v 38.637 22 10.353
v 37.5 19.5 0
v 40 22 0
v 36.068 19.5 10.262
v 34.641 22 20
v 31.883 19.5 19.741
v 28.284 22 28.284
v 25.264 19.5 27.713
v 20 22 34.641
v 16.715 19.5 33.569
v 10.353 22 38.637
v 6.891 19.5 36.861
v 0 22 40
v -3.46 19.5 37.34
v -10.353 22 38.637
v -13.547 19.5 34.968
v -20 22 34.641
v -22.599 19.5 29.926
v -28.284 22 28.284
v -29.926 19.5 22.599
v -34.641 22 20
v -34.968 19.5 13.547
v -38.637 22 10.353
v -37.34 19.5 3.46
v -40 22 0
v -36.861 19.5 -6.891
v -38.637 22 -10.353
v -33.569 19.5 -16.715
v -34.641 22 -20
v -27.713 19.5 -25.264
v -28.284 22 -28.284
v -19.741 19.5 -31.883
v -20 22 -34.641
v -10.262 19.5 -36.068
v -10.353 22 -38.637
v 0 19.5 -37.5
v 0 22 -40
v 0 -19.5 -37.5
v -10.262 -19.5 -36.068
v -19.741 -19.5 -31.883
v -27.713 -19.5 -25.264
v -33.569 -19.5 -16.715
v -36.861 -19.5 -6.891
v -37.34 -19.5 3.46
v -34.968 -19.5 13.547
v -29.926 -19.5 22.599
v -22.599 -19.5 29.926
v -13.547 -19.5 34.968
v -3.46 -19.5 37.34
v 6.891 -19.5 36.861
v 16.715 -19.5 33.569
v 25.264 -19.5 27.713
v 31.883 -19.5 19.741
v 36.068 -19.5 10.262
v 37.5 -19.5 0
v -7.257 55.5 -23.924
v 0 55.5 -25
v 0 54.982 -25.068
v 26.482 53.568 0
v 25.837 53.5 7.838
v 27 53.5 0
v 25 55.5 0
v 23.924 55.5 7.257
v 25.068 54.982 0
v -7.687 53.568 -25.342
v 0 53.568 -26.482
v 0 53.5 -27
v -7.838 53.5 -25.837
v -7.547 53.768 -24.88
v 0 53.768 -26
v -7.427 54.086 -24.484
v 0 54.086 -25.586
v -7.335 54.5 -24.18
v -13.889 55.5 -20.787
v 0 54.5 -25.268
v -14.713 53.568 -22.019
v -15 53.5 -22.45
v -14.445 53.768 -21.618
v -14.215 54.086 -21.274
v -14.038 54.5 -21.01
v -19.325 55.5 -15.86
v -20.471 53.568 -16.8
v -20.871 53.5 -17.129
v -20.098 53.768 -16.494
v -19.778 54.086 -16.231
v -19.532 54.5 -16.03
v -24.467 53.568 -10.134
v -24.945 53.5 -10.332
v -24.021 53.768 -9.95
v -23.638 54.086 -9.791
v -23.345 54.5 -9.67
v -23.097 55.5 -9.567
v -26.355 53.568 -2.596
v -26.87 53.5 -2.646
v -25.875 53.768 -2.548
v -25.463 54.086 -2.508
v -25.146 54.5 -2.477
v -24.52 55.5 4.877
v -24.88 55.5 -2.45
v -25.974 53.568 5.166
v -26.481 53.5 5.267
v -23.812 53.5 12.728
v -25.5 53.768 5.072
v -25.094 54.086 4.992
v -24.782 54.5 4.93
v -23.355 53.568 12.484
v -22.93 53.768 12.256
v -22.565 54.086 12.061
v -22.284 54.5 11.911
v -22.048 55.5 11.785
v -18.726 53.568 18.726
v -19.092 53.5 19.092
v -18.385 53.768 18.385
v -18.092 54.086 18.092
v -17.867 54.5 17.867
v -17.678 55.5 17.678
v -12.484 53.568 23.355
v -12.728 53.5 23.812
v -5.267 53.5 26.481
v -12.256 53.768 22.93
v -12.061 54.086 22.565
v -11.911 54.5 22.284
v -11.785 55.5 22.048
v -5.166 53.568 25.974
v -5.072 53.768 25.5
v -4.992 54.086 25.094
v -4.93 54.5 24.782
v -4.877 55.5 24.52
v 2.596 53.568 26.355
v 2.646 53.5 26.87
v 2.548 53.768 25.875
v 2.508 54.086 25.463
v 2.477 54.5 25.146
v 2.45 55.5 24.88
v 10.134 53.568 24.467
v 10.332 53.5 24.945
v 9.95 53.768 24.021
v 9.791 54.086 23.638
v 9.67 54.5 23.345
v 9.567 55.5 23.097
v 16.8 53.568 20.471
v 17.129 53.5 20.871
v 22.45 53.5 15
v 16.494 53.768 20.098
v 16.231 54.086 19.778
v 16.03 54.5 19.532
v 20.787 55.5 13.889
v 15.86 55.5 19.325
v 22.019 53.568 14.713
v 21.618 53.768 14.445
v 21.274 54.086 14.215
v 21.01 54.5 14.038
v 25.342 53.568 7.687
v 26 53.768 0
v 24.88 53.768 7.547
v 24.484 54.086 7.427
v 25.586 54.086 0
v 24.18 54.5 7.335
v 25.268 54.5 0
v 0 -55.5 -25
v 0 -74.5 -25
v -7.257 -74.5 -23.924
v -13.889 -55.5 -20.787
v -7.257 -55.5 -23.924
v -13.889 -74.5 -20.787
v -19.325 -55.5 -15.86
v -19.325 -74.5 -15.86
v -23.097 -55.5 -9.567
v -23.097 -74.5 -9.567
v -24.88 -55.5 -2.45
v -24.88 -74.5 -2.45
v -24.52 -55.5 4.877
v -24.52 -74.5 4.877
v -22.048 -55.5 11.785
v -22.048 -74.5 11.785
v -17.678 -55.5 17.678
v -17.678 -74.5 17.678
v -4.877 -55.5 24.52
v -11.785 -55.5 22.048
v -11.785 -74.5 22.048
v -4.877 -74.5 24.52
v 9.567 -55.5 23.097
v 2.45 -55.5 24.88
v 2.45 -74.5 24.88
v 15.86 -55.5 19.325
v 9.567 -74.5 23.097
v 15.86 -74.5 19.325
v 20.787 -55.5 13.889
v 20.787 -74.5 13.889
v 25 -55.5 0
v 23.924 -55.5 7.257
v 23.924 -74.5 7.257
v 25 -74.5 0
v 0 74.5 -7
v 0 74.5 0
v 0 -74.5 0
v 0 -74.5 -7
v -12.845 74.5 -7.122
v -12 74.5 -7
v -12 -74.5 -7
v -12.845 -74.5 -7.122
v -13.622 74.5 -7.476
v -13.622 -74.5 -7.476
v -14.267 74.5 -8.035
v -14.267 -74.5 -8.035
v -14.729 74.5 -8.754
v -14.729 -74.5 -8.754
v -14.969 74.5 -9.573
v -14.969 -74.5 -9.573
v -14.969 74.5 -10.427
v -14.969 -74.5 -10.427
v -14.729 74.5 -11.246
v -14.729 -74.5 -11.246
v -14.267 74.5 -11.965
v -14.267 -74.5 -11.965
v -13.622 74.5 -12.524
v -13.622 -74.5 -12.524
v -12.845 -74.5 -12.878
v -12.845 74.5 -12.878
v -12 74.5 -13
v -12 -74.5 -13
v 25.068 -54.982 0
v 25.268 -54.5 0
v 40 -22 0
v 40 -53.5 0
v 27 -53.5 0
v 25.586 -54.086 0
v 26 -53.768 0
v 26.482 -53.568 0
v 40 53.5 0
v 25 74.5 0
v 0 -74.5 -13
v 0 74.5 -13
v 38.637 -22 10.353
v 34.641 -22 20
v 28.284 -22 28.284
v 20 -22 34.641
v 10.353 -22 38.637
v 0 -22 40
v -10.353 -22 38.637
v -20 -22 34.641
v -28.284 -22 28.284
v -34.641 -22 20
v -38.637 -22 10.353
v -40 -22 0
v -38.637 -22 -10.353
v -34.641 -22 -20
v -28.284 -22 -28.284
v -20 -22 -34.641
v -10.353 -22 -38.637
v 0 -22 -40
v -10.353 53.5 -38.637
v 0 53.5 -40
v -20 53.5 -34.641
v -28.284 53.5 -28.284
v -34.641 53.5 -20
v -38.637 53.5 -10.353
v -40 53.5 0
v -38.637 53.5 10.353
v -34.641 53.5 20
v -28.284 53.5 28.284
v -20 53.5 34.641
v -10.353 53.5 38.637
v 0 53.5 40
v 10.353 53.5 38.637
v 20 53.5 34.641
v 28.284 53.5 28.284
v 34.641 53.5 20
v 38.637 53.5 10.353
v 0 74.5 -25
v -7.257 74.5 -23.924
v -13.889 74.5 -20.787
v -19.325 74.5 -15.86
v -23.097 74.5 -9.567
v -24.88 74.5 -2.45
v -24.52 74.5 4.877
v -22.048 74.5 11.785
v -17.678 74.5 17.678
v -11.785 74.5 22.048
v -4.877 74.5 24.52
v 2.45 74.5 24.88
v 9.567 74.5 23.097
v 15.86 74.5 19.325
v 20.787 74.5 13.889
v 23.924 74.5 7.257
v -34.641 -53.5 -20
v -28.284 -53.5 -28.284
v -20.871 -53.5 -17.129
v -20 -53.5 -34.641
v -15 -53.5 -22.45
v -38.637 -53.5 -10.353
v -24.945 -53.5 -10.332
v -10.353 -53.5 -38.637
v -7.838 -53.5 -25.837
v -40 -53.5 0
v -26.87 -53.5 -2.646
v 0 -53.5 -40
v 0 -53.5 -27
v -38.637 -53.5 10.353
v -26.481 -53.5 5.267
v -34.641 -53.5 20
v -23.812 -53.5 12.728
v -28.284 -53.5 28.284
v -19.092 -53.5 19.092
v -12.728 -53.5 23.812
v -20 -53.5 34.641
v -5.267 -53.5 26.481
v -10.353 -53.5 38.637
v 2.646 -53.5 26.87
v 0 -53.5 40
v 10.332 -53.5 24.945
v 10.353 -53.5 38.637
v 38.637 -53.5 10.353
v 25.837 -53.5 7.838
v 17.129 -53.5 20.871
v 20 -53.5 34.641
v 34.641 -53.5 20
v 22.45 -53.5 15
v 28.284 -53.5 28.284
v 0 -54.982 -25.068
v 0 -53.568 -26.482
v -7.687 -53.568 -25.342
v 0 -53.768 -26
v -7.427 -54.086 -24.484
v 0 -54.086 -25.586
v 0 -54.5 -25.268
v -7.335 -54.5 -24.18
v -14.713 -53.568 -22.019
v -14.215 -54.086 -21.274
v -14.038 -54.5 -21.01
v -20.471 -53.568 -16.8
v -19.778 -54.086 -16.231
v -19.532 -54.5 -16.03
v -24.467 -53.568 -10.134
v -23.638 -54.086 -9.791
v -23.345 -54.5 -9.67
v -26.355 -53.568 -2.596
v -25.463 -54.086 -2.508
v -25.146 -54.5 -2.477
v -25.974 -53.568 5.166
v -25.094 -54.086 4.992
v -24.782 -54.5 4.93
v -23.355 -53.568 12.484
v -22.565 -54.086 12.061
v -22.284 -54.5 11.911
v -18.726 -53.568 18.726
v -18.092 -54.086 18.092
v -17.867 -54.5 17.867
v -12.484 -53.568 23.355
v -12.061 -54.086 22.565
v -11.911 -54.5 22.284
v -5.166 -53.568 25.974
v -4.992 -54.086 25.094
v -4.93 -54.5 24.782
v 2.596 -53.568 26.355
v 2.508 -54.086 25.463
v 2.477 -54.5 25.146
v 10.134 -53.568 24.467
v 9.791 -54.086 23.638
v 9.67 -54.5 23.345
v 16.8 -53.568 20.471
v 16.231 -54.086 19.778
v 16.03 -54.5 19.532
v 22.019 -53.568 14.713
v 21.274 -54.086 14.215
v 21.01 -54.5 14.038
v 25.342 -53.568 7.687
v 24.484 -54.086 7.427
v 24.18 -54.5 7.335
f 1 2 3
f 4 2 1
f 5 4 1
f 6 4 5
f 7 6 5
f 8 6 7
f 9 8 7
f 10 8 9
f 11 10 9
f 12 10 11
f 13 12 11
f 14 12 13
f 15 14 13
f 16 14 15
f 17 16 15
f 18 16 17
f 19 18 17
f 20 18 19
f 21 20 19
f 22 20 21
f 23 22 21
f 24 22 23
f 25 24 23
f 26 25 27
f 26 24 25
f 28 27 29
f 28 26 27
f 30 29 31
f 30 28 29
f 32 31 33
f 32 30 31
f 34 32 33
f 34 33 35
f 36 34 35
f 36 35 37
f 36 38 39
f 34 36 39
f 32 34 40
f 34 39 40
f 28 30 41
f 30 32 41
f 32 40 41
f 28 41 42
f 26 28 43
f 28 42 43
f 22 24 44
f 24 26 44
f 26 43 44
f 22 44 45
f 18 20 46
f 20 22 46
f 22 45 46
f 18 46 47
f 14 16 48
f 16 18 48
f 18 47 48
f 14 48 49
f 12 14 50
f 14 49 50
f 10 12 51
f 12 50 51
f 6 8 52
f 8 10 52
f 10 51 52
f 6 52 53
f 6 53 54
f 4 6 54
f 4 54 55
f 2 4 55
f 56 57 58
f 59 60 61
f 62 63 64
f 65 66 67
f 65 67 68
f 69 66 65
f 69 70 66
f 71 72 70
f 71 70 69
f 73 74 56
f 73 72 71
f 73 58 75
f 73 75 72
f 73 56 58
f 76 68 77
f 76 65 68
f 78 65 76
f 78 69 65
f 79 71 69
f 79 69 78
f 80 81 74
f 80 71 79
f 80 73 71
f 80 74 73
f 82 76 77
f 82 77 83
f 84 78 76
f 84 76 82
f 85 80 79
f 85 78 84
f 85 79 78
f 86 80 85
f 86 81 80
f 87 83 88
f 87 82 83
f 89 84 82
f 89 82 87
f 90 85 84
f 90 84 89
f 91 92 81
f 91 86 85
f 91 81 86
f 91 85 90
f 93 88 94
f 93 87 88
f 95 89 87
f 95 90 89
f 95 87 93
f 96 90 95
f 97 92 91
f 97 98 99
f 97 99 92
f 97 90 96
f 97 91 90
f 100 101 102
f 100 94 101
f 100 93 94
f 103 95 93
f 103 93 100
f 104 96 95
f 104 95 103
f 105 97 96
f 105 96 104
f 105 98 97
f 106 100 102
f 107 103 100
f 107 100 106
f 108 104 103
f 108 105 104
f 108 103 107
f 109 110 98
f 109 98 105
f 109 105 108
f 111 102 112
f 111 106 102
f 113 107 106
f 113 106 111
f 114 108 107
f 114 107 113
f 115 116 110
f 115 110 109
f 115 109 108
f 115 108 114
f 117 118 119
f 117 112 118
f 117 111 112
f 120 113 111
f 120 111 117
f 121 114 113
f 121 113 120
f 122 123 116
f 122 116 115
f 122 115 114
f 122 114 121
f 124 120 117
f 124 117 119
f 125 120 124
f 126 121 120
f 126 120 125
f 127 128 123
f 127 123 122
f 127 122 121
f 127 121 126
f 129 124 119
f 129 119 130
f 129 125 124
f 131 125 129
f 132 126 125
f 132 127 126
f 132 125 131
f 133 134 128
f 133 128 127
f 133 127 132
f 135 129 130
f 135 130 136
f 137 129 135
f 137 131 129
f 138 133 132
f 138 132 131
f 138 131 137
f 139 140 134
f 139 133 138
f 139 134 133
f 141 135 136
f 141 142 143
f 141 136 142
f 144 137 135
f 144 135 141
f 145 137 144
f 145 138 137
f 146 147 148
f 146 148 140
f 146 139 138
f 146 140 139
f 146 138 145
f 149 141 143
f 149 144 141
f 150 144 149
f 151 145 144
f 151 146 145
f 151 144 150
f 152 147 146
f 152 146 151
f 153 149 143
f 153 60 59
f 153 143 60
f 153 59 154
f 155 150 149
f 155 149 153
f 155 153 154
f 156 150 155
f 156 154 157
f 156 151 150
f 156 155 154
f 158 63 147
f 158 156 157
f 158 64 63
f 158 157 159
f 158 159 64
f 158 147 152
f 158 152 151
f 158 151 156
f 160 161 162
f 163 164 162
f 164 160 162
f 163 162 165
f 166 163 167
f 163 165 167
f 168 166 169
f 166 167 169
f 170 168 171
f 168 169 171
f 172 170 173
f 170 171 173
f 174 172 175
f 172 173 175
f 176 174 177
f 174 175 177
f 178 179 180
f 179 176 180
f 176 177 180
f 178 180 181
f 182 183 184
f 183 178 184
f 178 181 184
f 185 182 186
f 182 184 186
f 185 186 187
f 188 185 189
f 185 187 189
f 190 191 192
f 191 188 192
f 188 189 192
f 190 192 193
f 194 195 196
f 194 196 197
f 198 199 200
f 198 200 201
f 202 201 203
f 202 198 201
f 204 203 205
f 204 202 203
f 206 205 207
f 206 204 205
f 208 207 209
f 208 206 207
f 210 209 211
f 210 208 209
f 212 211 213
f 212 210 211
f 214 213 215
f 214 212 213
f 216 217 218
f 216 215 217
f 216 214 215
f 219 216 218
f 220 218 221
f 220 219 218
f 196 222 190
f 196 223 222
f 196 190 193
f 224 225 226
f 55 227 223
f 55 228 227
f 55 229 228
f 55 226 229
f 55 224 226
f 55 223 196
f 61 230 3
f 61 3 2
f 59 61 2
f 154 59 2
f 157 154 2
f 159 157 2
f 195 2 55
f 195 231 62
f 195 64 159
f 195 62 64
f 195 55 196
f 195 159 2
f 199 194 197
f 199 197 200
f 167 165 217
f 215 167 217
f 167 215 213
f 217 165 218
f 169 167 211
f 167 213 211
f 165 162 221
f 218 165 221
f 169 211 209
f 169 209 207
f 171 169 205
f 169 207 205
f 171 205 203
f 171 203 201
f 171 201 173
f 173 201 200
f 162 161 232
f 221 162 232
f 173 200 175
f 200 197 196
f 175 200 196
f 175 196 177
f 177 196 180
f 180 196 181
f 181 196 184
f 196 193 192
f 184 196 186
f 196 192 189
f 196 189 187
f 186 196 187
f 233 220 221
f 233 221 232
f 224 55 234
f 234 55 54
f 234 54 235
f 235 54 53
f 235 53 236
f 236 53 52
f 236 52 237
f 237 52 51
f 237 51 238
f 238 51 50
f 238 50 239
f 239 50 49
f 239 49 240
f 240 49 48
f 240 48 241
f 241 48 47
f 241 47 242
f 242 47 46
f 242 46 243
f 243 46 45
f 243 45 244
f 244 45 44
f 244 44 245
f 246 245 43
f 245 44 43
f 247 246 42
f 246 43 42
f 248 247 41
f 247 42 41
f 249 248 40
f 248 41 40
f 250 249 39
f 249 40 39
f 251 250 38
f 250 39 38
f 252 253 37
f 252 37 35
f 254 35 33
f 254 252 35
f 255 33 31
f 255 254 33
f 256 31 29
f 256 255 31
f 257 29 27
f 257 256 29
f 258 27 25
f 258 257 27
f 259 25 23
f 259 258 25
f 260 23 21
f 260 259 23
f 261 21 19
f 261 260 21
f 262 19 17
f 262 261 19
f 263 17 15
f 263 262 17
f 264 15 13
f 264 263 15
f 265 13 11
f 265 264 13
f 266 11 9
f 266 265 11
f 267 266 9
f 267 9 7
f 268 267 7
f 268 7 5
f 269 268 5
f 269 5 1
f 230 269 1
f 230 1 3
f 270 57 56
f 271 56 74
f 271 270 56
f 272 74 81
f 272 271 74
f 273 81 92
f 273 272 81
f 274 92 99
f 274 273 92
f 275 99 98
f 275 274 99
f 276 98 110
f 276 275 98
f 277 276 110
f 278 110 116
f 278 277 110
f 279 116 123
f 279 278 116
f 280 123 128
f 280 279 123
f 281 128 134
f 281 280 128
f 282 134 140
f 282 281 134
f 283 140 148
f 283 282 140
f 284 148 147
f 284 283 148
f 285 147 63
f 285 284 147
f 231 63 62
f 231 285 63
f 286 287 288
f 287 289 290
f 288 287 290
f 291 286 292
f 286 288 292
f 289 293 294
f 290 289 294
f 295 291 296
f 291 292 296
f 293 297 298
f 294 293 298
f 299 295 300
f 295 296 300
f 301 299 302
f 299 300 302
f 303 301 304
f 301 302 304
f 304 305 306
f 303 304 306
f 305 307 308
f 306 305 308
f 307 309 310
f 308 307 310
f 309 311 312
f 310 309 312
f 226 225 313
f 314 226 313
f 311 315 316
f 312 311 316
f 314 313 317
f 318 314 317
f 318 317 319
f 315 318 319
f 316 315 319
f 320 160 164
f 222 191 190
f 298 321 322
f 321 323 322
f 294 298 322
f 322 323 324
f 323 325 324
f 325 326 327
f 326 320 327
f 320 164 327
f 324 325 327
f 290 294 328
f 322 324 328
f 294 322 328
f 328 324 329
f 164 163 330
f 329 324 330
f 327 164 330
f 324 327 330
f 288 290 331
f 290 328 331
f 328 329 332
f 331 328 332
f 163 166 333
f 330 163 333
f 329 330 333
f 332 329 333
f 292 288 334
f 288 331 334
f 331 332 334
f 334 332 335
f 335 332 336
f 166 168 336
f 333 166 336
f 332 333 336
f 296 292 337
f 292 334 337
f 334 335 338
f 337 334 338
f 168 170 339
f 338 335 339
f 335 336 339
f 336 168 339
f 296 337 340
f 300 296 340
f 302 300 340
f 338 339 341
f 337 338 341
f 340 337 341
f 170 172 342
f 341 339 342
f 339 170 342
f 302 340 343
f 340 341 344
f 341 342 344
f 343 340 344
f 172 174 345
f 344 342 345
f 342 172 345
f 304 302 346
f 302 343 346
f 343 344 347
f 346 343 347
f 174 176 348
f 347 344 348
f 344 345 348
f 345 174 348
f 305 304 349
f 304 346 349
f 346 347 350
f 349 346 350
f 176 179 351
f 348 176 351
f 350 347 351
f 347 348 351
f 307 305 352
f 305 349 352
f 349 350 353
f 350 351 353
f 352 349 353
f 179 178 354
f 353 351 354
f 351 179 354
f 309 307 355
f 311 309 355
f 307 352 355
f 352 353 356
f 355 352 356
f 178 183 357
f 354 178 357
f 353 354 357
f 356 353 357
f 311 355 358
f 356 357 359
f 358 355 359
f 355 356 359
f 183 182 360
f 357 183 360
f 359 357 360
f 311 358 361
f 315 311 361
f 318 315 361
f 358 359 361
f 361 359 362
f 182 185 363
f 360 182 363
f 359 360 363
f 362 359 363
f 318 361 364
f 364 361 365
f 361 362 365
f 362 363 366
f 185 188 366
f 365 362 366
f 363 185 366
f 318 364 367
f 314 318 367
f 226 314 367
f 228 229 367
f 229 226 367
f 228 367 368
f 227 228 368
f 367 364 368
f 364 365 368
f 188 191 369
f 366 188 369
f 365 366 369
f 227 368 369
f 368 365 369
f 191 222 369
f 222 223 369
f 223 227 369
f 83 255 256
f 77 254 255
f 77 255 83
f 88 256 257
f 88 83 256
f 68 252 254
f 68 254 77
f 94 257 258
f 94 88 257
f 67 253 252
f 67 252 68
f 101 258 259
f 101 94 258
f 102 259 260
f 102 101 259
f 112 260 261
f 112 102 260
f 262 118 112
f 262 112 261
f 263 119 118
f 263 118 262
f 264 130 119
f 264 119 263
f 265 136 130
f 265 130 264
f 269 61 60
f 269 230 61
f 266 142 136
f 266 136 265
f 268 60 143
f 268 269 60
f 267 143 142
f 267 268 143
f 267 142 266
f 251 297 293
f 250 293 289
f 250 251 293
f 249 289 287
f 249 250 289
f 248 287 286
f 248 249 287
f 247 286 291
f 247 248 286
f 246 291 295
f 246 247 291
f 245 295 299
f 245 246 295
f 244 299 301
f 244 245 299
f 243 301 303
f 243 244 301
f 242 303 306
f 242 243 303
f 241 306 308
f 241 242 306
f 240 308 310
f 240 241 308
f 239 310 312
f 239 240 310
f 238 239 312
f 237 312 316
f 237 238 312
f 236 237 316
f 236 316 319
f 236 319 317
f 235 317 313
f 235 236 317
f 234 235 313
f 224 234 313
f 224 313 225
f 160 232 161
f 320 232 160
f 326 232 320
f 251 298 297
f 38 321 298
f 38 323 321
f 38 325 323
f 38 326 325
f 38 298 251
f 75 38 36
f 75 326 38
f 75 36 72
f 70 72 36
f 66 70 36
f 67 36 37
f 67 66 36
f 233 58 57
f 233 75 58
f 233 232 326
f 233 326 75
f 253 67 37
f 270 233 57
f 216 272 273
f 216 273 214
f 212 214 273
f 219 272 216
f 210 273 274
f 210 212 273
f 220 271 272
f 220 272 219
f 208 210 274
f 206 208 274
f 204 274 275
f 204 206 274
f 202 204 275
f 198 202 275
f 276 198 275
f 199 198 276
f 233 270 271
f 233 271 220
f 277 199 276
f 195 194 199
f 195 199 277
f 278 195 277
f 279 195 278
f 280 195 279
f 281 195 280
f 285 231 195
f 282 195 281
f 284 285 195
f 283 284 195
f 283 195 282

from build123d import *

# Parameters (mm, degrees)
SKETCH1_R               = 40
BOSS_EXTRUDE1_DEPTH     = 74.5
SKETCH3_R               = 40
SKETCH3_R_2             = 25
CUT_EXTRUDE1_DEPTH      = 21
CUT_EXTRUDE2_DEPTH      = 22
CUT_EXTRUDE2_DEPTH_BACK = 22
SKETCH2_R               = 40
SKETCH2_R_2             = 37.5
CUT_EXTRUDE4_DEPTH      = 160.376911753
FILLET1_R               = 2
CUT_EXTRUDE5_DEPTH      = 160.376911753


with BuildPart() as part:
    # Sketch1 → Boss-Extrude1 (new, symmetric)
    with BuildSketch(Plane(origin=(0, 0, 0), x_dir=(1, 0, 0), z_dir=(0, 1, 0))):
        with Locations(Location((0, 0, 0), (0, 0, 270))):
            Circle(SKETCH1_R)
    extrude(amount=BOSS_EXTRUDE1_DEPTH, both=True)

    # Sketch3 → Cut-Extrude1 (cut)
    with BuildSketch(Plane(origin=(0, 74.5, 0), x_dir=(1, 0, 0), z_dir=(0, 1, 0))):
        with Locations(Location((0, 0, 0), (0, 0, 270))):
            Circle(SKETCH3_R)
        with Locations(Location((0, 0, 0), (0, 0, 270))):
            Circle(SKETCH3_R_2, mode=Mode.SUBTRACT)
    cut_extrude1 = extrude(amount=-CUT_EXTRUDE1_DEPTH, mode=Mode.SUBTRACT)

    # Mirror1: Cut-Extrude1 across plane
    add(cut_extrude1.mirror(Plane.ZX), mode=Mode.SUBTRACT)

    # Sketch2 → Cut-Extrude2 (cut, two sides: drawn at the far end of the back side and taken through both)
    with BuildSketch(Plane(origin=(0, 0, 0), x_dir=(1, 0, 0), z_dir=(0, 1, 0)).offset(-CUT_EXTRUDE2_DEPTH_BACK)):
        with Locations(Location((0, 0, 0), (0, 0, 270))):
            Circle(SKETCH2_R)
        with Locations(Location((0, 0, 0), (0, 0, 90))):
            Circle(SKETCH2_R_2, mode=Mode.SUBTRACT)
    extrude(amount=CUT_EXTRUDE2_DEPTH + CUT_EXTRUDE2_DEPTH_BACK, mode=Mode.SUBTRACT)

    # Sketch5 → Cut-Extrude4 (cut, through all)
    with BuildSketch(Plane(origin=(0, 74.5, 0), x_dir=(1, 0, 0), z_dir=(0, 1, 0))):
        with BuildLine():
            Line((-12, 13), (12, 13))
            ThreePointArc((12, 13), (15, 10), (12, 7))
            Line((12, 7), (-12, 7))
            ThreePointArc((-12, 7), (-15, 10), (-12, 13))
        make_face()
    extrude(amount=-CUT_EXTRUDE4_DEPTH, mode=Mode.SUBTRACT)

    # Fillet1
    fillet1_edges = [part.edges().sort_by_distance(p)[0] for p in [
        (0, -53.5, -25),
        (0, 53.5, -25),
    ]]
    fillet(fillet1_edges, radius=FILLET1_R)

    # Sketch7 → Revolve2 (revolve)
    with BuildSketch(Plane(origin=(0, 0, 0), x_dir=(0, 0, -1), z_dir=(1, 0, 0))):
        Polygon((40, 22), (37.5, 19.5), (37.5, 22), align=None)
    revolve2 = revolve(axis=Axis((0, 103.881416882, 0), (0, -1, 0)))

    # Mirror2: Revolve2 across plane
    add(revolve2.mirror(Plane.ZX))

    # Sketch4 → Cut-Extrude5 (cut, through all)
    with BuildSketch(Plane(origin=(0, 74.5, 0), x_dir=(1, 0, 0), z_dir=(0, 1, 0))):
        with BuildLine():
            Line((0, 0), (0, 40))
            ThreePointArc((0, 40), (28.284271247, 28.284271247), (40, 0))
            Line((40, 0), (0, 0))
        make_face()
    extrude(amount=-CUT_EXTRUDE5_DEPTH, mode=Mode.SUBTRACT)


solid = part.part
